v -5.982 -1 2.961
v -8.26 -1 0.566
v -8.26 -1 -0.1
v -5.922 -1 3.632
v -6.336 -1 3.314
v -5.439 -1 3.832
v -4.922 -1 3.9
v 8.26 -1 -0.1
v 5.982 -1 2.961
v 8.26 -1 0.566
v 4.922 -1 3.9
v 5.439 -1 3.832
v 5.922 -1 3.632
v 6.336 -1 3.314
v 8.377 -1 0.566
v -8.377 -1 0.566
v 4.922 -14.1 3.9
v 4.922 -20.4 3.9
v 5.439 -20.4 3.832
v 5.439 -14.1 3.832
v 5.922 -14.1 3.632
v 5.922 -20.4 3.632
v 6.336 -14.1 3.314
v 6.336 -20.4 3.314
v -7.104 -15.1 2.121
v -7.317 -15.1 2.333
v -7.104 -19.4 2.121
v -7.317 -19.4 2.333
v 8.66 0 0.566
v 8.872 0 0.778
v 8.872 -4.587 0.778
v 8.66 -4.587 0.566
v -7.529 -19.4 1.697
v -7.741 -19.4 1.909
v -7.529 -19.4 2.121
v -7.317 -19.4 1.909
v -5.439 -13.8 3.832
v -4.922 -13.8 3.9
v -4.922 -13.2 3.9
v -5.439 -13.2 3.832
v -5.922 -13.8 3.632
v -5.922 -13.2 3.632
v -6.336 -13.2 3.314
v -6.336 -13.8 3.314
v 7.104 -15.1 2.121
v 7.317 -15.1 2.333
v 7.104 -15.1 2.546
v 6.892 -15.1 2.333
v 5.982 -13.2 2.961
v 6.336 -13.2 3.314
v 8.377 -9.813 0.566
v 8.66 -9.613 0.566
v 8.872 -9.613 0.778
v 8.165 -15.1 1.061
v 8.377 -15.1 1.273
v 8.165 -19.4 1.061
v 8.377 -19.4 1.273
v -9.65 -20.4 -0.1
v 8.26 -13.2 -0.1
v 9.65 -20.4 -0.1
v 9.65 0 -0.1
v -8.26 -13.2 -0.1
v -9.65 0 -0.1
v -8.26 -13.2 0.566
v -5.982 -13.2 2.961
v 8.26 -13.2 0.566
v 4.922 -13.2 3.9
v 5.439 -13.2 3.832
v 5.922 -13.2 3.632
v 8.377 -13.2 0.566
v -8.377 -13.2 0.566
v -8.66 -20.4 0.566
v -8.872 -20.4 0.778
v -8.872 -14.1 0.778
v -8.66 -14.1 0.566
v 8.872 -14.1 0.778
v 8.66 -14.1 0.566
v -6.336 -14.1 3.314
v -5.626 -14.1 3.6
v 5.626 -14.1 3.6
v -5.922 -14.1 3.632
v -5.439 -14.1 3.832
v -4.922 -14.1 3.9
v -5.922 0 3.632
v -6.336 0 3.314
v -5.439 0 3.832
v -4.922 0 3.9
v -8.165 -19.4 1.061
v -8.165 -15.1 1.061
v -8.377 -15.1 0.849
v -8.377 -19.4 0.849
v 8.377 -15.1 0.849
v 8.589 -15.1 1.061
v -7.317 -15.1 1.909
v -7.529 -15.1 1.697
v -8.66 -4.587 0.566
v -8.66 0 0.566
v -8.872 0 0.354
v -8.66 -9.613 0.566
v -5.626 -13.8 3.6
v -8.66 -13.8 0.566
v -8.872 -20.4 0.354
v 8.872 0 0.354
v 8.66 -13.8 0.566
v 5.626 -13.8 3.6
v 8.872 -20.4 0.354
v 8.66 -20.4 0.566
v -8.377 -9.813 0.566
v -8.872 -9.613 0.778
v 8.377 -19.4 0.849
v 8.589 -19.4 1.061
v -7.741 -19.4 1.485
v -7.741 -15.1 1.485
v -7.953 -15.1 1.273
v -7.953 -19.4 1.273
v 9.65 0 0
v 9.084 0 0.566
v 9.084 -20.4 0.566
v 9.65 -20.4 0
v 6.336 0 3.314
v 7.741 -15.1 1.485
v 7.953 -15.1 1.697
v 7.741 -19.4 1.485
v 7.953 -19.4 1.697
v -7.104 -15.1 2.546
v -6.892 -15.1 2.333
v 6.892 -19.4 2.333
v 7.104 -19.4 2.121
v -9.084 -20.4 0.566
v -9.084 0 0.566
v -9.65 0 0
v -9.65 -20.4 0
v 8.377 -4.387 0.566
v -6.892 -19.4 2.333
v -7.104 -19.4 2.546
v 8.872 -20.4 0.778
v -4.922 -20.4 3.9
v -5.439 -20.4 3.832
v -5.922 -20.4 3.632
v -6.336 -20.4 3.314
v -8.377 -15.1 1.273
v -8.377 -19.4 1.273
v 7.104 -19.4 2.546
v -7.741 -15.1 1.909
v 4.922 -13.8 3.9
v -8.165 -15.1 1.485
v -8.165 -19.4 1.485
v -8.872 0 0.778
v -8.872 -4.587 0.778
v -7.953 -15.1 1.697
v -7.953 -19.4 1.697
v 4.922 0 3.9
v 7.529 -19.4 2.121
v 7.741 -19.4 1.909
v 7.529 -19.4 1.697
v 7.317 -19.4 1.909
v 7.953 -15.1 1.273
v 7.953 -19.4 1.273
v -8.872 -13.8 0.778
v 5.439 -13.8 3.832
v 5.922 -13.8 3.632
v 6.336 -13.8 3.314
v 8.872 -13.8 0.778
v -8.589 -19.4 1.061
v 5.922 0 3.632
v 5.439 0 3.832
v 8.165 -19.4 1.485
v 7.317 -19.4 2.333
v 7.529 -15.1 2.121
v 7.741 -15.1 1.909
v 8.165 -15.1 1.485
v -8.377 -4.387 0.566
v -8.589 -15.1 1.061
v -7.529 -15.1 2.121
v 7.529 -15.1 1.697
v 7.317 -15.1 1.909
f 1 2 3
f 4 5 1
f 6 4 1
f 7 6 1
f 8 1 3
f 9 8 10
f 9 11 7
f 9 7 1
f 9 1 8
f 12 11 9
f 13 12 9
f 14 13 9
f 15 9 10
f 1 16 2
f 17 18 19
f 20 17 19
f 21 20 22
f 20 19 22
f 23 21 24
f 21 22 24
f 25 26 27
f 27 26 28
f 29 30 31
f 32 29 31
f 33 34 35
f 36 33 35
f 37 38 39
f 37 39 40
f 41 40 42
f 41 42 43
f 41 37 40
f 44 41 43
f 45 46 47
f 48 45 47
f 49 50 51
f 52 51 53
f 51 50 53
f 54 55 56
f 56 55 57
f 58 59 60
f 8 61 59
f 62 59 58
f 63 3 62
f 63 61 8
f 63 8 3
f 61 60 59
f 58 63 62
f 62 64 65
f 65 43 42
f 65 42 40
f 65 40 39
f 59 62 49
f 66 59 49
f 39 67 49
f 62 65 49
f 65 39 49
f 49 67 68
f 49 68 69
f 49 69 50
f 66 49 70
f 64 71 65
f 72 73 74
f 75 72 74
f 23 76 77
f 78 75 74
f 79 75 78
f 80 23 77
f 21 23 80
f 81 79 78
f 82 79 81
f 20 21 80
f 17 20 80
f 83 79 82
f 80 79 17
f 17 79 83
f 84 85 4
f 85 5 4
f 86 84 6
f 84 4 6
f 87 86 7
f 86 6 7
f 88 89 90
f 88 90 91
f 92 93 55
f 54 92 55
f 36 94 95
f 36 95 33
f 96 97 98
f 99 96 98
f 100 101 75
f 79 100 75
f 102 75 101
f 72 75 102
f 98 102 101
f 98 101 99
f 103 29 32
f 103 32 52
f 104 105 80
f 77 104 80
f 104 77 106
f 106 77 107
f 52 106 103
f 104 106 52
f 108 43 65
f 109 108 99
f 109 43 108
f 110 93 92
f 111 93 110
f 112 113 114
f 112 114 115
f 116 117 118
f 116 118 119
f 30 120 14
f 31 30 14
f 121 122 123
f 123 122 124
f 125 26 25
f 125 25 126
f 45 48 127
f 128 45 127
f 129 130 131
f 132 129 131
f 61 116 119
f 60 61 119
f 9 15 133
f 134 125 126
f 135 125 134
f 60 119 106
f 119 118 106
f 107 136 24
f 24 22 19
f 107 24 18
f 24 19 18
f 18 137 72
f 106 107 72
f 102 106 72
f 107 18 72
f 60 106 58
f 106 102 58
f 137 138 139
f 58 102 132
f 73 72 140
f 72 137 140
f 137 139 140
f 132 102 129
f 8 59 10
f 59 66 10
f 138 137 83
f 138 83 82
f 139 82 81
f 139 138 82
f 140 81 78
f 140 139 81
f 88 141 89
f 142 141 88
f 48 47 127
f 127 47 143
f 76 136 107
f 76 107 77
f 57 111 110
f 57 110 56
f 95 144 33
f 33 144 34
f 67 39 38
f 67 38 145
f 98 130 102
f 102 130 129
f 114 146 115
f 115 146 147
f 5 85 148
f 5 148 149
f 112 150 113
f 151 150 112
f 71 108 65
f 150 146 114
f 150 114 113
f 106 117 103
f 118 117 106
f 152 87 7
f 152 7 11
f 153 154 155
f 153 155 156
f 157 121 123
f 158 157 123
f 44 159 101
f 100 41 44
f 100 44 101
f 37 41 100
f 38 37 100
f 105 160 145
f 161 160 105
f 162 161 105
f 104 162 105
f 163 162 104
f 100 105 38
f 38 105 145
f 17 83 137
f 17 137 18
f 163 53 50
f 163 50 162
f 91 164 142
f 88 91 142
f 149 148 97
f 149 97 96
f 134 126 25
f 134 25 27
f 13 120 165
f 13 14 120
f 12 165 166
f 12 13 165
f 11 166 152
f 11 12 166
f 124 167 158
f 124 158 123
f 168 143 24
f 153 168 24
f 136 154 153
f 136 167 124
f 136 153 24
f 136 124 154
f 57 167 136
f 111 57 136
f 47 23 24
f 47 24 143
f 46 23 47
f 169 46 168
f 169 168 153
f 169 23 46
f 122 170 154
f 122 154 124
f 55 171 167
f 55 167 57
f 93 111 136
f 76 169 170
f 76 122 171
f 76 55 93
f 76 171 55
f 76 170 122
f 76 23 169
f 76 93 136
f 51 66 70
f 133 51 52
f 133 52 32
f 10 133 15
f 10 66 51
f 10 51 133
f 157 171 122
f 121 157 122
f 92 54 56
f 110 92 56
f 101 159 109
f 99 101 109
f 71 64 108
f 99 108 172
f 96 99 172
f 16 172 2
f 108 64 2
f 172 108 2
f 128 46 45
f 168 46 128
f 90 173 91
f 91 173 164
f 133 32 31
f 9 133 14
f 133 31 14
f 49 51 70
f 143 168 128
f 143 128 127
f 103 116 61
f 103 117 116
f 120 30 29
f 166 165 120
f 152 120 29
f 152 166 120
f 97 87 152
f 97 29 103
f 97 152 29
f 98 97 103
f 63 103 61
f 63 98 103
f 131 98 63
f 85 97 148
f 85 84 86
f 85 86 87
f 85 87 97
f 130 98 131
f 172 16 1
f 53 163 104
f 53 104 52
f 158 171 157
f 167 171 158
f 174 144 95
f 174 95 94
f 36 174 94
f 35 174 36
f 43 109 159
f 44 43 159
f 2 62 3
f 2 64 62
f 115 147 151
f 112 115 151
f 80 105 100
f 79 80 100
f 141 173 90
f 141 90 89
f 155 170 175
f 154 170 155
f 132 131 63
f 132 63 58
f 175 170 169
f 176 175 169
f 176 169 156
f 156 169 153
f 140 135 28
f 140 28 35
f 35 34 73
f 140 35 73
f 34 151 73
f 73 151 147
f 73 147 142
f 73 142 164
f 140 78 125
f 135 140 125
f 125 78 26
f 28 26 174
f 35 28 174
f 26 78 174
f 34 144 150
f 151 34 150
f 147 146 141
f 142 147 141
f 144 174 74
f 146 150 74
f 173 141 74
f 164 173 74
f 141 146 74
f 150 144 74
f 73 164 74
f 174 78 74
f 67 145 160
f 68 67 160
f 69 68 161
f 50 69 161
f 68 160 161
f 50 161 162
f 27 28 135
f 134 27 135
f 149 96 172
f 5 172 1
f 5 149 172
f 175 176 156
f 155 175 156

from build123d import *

# Parameters (mm, degrees)
F1_DEPTH  = 20.4
F3_DEPTH  = 0.3
F4_W      = 12.2
F4_H      = 3.3343145751
F5_DEPTH  = 8.8731825407
F6_W      = 8.2600505063
F6_H      = 12.2
F7_DEPTH  = 25
F8_W      = 4.3
F8_H      = 0.3
F9_DEPTH  = 0.3
F10_F1_R  = 2
F10_F2_R  = 2
F12_DEPTH = 0.5
F13_W     = 8.8721825407
F13_H     = 0.3
F14_DEPTH = 0.3
F16_DEPTH = 0.1


# Not quite as in the source:
# - a feature names something its author has since deleted; it is built from what else it names


with BuildPart() as f1:
    # F0 (on Front) → F1 (new body)
    with BuildSketch(Plane.XZ):
        Polygon((-9.65, 0), (0, 0), (0, 3.9), (-5.75, 3.9), align=None)
    extrude(amount=F1_DEPTH)

    # F2 (on face) → F3 (cut)
    with BuildSketch(Plane(origin=(-4.825, 0, 4.825), x_dir=(0, -1, 0), z_dir=(-0.7071067812, 0, 0.7071067812))):
        Polygon((13.8, -5.7235804385), (0, -5.7235804385), (0, -6.0235804385), (20.4, -6.0235804385), (20.4, -5.7235804385), (14.1, -5.7235804385), (14.1, 0.1956567054), (13.8, 0.1956567054), align=None)
    extrude(amount=-F3_DEPTH, mode=Mode.SUBTRACT)

    # F4 (on face) → F5 (cut, through all)
    with BuildSketch(Plane.YZ):
        with Locations((-7.1, 2.2328427125)):
            Rectangle(F4_W, F4_H)
    extrude(amount=-F5_DEPTH, mode=Mode.SUBTRACT)

    # F6 (on face) → F7 (cut)
    with BuildSketch(Plane.XY.offset(0.5656854249)):
        with Locations((-4.1300252532, -7.1)):
            Rectangle(F6_W, F6_H)
    extrude(amount=-F7_DEPTH, mode=Mode.SUBTRACT)

    # F8 (on face) → F9 (cut)
    with BuildSketch(Plane(origin=(-4.825, 0, 4.825), x_dir=(0, -1, 0), z_dir=(-0.7071067812, 0, 0.7071067812))):
        with Locations((17.25, -3.3735804385)):
            Rectangle(F8_W, F8_H)
        with Locations((17.25, -3.9735804385)):
            Rectangle(F8_W, F8_H)
        with Locations((17.25, -5.1735804385)):
            Rectangle(F8_W, F8_H)
        with Locations((17.25, -4.5735804385)):
            Rectangle(F8_W, F8_H)
    extrude(amount=-F9_DEPTH, mode=Mode.SUBTRACT)

    # F10: fillet of radius 2 on 3 edges, made by hand

    # F10_f1
    f10_f1_edges = [f1.edges().sort_by_distance(p)[0] for p in [
        (-5.75, -0.5, 3.9),
    ]]
    fillet(f10_f1_edges, radius=F10_F1_R)

    # F10_f2
    f10_f2_edges = [f1.edges().sort_by_distance(p)[0] for p in [
        (-5.75, -13.5, 3.9),
    ]]
    fillet(f10_f2_edges, radius=F10_F2_R)

    # F11 (on face) → F12 (join)
    with BuildSketch(Plane(origin=(-4.825, 0, 4.825), x_dir=(0, -1, 0), z_dir=(-0.7071067812, 0, 0.7071067812))):
        Polygon((1, -2.1365746699), (1, -5.7235804385), (4.5870057685, -5.7235804385), align=None)
        Polygon((13.2, -5.7235804385), (13.2, -2.1365746699), (9.6129942315, -5.7235804385), align=None)
    extrude(amount=-F12_DEPTH)

    # F13 (on face) → F14 (cut)
    with BuildSketch(Plane.XY.offset(3.9)):
        with Locations((-4.4360912703, -13.95)):
            Rectangle(F13_W, F13_H)
    extrude(amount=-F14_DEPTH, mode=Mode.SUBTRACT)

    # F15: F1 across face


with BuildPart() as f1_1:
    add(f1.part)
    add(f1.part.mirror(Plane(origin=(0, -16.8091639871, 1.9442122186), x_dir=(0, 1, 0), z_dir=(1, 0, 0))))

    # F16 (add): a face of the model
    f16_faces = [f1_1.faces().sort_by_distance(p)[0] for p in [
        (0, -13.4511563716, 0),
    ]]
    extrude(f16_faces, amount=F16_DEPTH)


solid = f1_1.part
